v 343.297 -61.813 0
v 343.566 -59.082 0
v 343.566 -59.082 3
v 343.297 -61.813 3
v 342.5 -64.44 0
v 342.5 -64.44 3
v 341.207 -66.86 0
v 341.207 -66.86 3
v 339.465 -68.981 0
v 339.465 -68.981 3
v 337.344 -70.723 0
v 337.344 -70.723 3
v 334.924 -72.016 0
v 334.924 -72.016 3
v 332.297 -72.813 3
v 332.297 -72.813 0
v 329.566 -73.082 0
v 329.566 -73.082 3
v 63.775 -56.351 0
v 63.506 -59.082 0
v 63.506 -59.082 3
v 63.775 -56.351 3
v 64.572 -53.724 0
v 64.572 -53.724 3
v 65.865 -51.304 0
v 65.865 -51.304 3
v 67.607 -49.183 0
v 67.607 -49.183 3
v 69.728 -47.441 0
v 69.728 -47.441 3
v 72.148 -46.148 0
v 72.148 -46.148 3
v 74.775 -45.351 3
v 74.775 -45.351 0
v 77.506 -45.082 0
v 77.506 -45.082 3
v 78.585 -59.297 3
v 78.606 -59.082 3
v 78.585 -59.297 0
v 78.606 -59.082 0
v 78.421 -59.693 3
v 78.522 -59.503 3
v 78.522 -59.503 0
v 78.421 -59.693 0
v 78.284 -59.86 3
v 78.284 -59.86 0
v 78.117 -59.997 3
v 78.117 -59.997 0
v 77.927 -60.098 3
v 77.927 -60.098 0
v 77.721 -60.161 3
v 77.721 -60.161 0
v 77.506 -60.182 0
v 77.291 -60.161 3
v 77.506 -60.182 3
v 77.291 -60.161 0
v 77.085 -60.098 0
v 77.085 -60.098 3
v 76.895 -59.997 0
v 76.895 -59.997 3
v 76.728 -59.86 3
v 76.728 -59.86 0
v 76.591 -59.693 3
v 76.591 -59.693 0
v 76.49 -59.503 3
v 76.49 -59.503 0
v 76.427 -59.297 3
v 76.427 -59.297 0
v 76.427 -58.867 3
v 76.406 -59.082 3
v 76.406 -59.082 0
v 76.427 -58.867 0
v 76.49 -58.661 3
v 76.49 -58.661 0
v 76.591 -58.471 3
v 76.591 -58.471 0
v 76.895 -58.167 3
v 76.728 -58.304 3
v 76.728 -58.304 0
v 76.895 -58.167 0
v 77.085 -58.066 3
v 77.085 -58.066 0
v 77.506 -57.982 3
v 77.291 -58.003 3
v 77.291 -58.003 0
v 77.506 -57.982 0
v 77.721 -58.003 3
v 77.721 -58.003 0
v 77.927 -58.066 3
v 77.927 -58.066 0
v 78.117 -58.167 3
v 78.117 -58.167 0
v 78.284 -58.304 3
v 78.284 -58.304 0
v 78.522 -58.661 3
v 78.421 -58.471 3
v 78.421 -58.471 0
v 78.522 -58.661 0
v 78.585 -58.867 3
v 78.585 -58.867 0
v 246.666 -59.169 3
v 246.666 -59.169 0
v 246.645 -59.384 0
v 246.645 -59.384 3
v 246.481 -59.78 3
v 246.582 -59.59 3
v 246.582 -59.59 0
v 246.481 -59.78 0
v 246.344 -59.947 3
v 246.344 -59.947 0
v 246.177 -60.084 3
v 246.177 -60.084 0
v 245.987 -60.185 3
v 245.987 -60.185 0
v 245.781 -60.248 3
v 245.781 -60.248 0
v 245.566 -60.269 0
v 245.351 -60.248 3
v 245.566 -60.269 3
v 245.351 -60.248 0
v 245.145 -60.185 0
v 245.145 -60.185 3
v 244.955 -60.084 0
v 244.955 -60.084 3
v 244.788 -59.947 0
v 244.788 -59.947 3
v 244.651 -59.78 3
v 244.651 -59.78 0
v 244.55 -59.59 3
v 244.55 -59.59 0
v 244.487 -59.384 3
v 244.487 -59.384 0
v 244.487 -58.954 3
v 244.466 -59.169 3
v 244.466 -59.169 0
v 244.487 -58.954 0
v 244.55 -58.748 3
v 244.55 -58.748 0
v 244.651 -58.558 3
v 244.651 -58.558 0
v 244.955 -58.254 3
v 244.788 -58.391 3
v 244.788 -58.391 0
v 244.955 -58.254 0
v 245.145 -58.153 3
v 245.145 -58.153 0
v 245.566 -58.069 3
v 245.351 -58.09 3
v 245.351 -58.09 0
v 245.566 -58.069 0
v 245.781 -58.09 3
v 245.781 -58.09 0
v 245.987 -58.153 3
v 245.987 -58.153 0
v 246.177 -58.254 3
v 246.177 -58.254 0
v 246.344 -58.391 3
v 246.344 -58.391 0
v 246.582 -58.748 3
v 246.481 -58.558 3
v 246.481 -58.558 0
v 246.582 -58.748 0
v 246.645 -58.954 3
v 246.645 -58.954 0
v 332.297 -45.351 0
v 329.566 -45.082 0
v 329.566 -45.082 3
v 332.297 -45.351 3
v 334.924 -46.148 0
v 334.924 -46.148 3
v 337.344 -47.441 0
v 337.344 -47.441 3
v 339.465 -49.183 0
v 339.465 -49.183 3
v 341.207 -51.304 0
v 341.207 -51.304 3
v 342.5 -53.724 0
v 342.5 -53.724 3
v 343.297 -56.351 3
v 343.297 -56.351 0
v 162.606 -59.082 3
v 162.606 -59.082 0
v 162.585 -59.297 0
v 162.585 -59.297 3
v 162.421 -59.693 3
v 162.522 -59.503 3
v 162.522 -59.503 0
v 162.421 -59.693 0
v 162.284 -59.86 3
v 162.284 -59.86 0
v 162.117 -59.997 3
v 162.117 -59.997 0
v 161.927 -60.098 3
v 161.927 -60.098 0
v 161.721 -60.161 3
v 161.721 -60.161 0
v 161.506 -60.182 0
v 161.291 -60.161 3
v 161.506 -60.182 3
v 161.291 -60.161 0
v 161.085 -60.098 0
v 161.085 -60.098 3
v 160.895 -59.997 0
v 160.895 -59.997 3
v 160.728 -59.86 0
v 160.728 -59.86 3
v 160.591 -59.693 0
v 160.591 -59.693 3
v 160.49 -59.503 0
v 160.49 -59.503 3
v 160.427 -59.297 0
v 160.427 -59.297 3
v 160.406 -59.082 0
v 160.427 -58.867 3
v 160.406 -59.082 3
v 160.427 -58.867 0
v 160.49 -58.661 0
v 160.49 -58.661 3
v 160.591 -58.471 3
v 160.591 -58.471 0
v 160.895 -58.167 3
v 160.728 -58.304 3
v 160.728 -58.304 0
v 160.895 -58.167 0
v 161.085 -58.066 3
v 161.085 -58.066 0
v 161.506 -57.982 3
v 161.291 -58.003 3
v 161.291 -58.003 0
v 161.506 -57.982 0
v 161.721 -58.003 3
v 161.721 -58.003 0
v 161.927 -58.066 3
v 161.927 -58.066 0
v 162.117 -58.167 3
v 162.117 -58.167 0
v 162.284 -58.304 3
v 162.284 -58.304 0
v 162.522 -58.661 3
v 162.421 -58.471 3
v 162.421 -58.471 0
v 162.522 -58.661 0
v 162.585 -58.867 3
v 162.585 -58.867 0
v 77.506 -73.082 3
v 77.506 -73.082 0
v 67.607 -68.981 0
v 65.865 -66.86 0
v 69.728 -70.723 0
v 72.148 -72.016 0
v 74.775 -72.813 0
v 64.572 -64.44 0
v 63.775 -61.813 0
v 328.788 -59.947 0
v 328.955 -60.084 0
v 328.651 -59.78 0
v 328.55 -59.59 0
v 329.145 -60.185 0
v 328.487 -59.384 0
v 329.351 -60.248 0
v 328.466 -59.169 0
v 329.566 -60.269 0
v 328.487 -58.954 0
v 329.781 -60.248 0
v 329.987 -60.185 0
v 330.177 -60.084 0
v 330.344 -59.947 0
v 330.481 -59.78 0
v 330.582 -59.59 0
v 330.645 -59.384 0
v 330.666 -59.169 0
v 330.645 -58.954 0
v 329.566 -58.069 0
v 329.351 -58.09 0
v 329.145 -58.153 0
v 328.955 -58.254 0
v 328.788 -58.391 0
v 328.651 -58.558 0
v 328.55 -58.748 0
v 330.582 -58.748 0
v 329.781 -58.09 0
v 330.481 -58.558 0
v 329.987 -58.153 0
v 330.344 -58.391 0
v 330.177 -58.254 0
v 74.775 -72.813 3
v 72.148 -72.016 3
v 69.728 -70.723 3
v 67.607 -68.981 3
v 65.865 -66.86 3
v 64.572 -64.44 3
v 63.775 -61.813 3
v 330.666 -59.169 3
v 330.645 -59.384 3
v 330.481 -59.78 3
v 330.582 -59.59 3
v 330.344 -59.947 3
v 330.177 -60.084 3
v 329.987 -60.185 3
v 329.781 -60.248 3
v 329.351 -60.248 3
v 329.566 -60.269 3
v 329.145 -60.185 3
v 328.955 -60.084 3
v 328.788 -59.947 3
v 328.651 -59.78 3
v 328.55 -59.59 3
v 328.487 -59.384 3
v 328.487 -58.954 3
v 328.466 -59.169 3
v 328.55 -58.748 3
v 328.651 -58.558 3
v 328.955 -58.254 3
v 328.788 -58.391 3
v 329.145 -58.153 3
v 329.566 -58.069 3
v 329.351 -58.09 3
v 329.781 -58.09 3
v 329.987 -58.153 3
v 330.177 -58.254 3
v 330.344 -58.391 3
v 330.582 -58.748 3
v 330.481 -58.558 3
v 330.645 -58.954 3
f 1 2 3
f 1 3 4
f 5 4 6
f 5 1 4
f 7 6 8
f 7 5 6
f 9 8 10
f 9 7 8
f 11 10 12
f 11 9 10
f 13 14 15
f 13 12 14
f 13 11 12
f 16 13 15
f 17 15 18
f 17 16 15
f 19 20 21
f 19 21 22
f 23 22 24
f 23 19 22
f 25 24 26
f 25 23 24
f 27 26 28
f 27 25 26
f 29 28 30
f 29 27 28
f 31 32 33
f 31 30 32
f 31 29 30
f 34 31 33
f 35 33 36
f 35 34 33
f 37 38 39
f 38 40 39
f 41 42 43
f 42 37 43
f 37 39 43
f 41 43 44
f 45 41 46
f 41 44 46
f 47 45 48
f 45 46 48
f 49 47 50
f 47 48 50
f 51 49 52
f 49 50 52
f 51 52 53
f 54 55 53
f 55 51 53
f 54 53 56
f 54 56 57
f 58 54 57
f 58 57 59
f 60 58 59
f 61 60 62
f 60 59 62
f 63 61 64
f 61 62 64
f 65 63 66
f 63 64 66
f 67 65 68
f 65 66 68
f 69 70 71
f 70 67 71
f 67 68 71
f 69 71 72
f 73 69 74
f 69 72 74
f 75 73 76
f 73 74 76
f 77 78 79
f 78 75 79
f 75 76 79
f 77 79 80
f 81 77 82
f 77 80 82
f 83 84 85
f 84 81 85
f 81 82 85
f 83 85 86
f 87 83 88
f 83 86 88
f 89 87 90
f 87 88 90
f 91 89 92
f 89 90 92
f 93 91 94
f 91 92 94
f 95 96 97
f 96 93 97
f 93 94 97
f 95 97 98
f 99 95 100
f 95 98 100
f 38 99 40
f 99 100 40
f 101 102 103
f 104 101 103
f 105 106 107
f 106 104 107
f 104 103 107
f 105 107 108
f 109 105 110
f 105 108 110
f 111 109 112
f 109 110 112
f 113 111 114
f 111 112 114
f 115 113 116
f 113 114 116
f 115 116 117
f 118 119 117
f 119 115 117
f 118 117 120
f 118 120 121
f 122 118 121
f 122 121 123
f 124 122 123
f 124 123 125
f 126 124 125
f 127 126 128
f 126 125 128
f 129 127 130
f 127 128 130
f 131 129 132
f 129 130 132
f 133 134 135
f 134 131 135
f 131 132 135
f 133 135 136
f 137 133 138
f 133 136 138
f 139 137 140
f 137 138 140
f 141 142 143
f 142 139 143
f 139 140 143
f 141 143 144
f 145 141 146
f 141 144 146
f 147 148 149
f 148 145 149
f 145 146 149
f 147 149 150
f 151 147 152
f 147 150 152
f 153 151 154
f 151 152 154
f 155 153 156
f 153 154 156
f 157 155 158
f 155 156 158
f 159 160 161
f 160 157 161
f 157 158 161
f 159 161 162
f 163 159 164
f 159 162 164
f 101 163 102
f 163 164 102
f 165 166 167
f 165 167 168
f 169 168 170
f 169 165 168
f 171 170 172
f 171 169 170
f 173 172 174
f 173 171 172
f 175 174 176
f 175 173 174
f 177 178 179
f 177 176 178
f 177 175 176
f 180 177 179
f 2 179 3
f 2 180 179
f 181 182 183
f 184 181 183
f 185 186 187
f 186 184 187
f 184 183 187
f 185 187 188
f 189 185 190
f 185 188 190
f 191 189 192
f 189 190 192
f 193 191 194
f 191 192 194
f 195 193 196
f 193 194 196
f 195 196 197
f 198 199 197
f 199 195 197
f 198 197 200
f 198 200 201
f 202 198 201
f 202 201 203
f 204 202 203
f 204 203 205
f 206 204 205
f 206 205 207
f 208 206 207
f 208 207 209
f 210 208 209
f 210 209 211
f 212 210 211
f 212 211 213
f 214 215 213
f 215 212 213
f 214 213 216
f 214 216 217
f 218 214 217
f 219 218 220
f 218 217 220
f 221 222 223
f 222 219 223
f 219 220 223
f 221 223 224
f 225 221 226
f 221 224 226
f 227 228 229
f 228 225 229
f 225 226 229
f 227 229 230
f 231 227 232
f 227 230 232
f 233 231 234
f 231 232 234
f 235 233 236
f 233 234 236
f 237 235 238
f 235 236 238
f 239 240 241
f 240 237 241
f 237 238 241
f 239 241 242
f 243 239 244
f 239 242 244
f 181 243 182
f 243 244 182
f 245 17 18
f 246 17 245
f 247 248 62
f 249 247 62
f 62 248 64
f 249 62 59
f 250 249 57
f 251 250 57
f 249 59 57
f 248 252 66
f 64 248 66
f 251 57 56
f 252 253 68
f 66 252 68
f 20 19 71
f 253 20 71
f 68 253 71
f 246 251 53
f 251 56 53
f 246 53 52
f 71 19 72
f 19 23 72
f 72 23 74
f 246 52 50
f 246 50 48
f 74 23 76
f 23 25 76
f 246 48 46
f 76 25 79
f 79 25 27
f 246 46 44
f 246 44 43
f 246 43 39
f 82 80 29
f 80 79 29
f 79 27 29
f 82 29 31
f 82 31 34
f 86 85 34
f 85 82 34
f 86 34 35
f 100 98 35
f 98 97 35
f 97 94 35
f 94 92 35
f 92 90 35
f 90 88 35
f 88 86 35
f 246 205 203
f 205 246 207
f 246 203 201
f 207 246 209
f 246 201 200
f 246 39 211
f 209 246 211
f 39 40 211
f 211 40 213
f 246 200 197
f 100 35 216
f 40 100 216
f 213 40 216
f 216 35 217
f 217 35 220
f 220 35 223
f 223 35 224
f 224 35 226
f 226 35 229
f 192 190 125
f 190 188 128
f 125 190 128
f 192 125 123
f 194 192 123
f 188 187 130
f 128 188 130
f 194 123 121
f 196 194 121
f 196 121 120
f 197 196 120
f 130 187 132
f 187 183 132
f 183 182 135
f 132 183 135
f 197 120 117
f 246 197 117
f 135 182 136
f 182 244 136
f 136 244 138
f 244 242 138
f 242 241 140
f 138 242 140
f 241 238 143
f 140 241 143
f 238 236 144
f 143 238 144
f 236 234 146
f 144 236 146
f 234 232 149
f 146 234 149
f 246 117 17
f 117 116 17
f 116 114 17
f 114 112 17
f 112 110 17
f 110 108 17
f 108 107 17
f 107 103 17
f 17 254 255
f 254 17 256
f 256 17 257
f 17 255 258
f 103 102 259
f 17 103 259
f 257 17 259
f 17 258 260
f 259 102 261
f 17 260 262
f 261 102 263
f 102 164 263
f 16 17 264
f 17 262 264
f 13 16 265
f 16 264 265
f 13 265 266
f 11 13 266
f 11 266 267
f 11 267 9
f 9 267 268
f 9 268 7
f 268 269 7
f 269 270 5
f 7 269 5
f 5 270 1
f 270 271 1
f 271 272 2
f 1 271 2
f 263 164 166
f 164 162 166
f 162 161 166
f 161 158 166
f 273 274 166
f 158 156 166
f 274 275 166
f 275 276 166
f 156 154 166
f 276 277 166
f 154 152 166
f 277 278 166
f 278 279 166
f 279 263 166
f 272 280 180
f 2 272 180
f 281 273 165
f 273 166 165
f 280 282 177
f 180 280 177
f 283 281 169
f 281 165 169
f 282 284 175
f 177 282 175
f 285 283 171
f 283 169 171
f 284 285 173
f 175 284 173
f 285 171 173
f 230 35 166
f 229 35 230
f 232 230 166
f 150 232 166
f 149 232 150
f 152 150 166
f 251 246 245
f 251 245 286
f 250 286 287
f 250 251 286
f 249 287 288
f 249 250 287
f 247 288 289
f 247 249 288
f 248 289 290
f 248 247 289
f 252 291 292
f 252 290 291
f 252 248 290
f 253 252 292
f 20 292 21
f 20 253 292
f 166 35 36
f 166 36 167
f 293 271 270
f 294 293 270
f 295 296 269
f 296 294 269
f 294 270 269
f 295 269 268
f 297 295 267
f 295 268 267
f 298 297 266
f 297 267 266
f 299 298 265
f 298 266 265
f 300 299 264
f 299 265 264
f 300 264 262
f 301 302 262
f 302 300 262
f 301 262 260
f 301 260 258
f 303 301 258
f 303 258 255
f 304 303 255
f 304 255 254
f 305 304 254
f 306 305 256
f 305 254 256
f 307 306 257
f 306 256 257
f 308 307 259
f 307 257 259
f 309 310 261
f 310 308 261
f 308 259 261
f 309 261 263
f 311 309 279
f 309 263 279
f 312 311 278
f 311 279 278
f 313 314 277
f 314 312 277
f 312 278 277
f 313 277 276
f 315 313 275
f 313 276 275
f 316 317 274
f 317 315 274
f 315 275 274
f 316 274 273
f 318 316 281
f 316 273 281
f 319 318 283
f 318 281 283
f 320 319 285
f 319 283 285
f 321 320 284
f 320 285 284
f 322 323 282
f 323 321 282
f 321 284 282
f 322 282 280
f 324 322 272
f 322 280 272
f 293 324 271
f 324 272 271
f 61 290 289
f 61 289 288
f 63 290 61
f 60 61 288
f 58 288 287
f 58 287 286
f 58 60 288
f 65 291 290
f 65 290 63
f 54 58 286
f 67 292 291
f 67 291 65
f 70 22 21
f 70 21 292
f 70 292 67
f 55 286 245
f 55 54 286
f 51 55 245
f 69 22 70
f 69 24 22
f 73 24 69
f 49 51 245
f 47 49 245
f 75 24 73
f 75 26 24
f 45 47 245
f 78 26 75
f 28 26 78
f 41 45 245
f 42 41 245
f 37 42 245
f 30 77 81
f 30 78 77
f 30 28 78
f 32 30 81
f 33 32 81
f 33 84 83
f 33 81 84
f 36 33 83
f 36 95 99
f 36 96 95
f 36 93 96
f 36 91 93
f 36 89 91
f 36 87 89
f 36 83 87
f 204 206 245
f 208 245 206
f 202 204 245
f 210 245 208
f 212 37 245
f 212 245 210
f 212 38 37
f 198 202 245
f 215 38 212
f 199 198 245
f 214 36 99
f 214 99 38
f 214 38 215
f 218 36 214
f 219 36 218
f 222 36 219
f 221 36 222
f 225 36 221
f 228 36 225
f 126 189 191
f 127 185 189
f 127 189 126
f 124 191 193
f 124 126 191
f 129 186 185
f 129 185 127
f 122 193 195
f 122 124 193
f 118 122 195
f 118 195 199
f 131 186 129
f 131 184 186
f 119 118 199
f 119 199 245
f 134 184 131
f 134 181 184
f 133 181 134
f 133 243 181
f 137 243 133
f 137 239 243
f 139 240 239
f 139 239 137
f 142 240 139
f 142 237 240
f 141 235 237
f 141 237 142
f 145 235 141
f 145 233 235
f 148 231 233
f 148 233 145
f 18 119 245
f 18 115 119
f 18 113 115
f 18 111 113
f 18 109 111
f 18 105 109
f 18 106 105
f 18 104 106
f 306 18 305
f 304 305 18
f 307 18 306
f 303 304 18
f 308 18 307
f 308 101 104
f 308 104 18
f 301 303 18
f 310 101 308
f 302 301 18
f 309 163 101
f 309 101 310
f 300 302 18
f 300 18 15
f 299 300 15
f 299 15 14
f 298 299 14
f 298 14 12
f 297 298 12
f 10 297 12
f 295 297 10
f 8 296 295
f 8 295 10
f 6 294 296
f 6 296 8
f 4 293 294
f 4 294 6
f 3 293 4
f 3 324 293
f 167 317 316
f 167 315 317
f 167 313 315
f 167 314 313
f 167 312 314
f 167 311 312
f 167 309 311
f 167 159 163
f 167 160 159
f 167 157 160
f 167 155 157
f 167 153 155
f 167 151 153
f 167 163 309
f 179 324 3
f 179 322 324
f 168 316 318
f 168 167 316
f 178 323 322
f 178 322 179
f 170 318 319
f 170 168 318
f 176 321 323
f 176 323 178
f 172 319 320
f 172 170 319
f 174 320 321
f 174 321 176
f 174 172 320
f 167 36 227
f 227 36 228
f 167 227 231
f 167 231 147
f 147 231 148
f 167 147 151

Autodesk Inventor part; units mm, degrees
ref_plane "YZ Plane" through (0, 0, 0) normal (1, 0, 0) x (0, 1, 0)
ref_plane "XZ Plane" through (0, 0, 0) normal (0, 1, 0) x (-1, 0, 0)
ref_plane "XY Plane" through (0, 0, 0) normal (0, 0, 1) x (1, 0, 0)
ref_plane "Work Plane2" through (35.545, -31.609, 1.6) normal (0, 0, 1) x (1, 0, 0)
sketch "Sketch2" plane through (35.545, -31.609, 1.6) normal (0, 0, 1) x (1, 0, 0)
  line L0 (-4.7778, 3.1171) -> (341.5466, 3.1925) construction
  line L1 (341.5466, 3.1925) -> (341.5765, -133.848) construction
  line L2 (341.5765, -133.848) -> (-4.7479, -133.9235) construction
  line L3 (-4.7479, -133.9235) -> (-4.7778, 3.1171) construction
  point P0 (-35.545, 31.609)
ref_plane "Work Plane1" through (371.545, -162.609, 0) normal (0, 0, -1) x (-1, 0, 0)
sketch "Sketch9" plane through (371.545, -162.609, 0) normal (0, 0, -1) x (-1, 0, 0)
  line L0 (336, 131) -> (0, 131) projected
  line L1 (-2, 129) -> (-2, 2) projected
  line L2 (-1.9796, 129.2846) -> (-2, 129) projected
  line L3 (-1.919, 129.5635) -> (-1.9796, 129.2846) projected
  line L4 (-1.8193, 129.8308) -> (-1.919, 129.5635) projected
  line L5 (-1.6825, 130.0813) -> (-1.8193, 129.8308) projected
  line L6 (-1.5115, 130.3097) -> (-1.6825, 130.0813) projected
  line L7 (-1.3097, 130.5115) -> (-1.5115, 130.3097) projected
  line L8 (-1.0813, 130.6825) -> (-1.3097, 130.5115) projected
  line L9 (-0.8308, 130.8193) -> (-1.0813, 130.6825) projected
  line L10 (-0.5635, 130.919) -> (-0.8308, 130.8193) projected
  line L11 (-0.2846, 130.9796) -> (-0.5635, 130.919) projected
  line L12 (0, 131) -> (-0.2846, 130.9796) projected
  circle A0 centre (2.362, 128.645) radius 1.1 projected
  circle A1 centre (68.695, 128.645) radius 1.1 projected
  circle A2 centre (135.028, 128.645) radius 1.1 projected
  circle A3 centre (201.361, 128.645) radius 1.1 projected
  circle A4 centre (267.694, 128.645) radius 1.1 projected
  circle A5 centre (334.027, 128.645) radius 1.1 projected
  line L13 (338, 2) -> (338, 129) projected
  line L14 (338, 129) -> (337.9796, 129.2846) projected
  line L15 (337.9796, 129.2846) -> (337.919, 129.5635) projected
  line L16 (337.919, 129.5635) -> (337.8193, 129.8308) projected
  line L17 (337.8193, 129.8308) -> (337.6825, 130.0813) projected
  line L18 (337.6825, 130.0813) -> (337.5115, 130.3097) projected
  line L19 (337.5115, 130.3097) -> (337.3097, 130.5115) projected
  line L20 (337.3097, 130.5115) -> (337.0813, 130.6825) projected
  line L21 (337.0813, 130.6825) -> (336.8308, 130.8193) projected
  line L22 (336.8308, 130.8193) -> (336.5635, 130.919) projected
  line L23 (336.5635, 130.919) -> (336.2846, 130.9796) projected
  line L24 (336.2846, 130.9796) -> (336, 131) projected
  line L25 (0, 0) -> (336, 0) projected
  line L26 (336, 0) -> (336.2846, 0.0204) projected
  line L27 (336.2846, 0.0204) -> (336.5635, 0.081) projected
  line L28 (336.5635, 0.081) -> (336.8308, 0.1807) projected
  line L29 (336.8308, 0.1807) -> (337.0813, 0.3175) projected
  line L30 (337.0813, 0.3175) -> (337.3097, 0.4885) projected
  line L31 (337.3097, 0.4885) -> (337.5115, 0.6903) projected
  line L32 (337.5115, 0.6903) -> (337.6825, 0.9187) projected
  line L33 (337.6825, 0.9187) -> (337.8193, 1.1692) projected
  line L34 (337.8193, 1.1692) -> (337.919, 1.4365) projected
  line L35 (337.919, 1.4365) -> (337.9796, 1.7154) projected
  line L36 (337.9796, 1.7154) -> (338, 2) projected
  circle A6 centre (334.02, 2.37) radius 1.1 projected
  circle A7 centre (267.687, 2.37) radius 1.1 projected
  circle A8 centre (201.354, 2.37) radius 1.1 projected
  circle A9 centre (135.021, 2.37) radius 1.1 projected
  circle A10 centre (68.688, 2.37) radius 1.1 projected
  circle A11 centre (2.355, 2.37) radius 1.1 projected
  line L37 (-0.2846, 0.0204) -> (0, 0) projected
  line L38 (-0.5635, 0.081) -> (-0.2846, 0.0204) projected
  line L39 (-0.8308, 0.1807) -> (-0.5635, 0.081) projected
  line L40 (-1.0813, 0.3175) -> (-0.8308, 0.1807) projected
  line L41 (-1.3097, 0.4885) -> (-1.0813, 0.3175) projected
  line L42 (-1.5115, 0.6903) -> (-1.3097, 0.4885) projected
  line L43 (-1.6825, 0.9187) -> (-1.5115, 0.6903) projected
  line L44 (-1.8193, 1.1692) -> (-1.6825, 0.9187) projected
  line L45 (-1.919, 1.4365) -> (-1.8193, 1.1692) projected
  line L46 (-1.9796, 1.7154) -> (-1.919, 1.4365) projected
  line L47 (-2, 2) -> (-1.9796, 1.7154) projected
  circle A12 centre (41.979, 103.44) radius 1.1 projected
  circle A13 centre (125.979, 103.44) radius 1.1 projected
  circle A14 centre (210.039, 103.527) radius 1.1 projected
  circle A15 centre (294.039, 103.527) radius 1.1 projected
  point P0 (371.545, 162.609)
ref_plane "Work Plane3" through (371.545, -162.609, 0) normal (0, 0, 1) x (1, 0, 0)
sketch "Sketch10" plane through (371.545, -162.609, 0) normal (0, 0, 1) x (1, 0, 0)
  circle A0 centre (-294.039, 103.527) radius 1.1 projected
  circle A1 centre (-210.039, 103.527) radius 1.1 projected
  circle A2 centre (-125.979, 103.44) radius 1.1 projected
  circle A3 centre (-41.979, 103.44) radius 1.1 projected
  line L0 (-294.039, 117.527) -> (-41.979, 117.527)
  line L1 (-27.979, 103.527) -> (-27.979, 103.527)
  line L2 (-41.979, 89.527) -> (-294.039, 89.527)
  line L3 (-308.039, 103.527) -> (-308.039, 103.527)
  arc A4 (-27.979, 103.527) -> (-41.979, 117.527) centre (-41.979, 103.527) ccw
  arc A5 (-41.979, 89.527) -> (-27.979, 103.527) centre (-41.979, 103.527) ccw
  arc A6 (-294.039, 117.527) -> (-308.039, 103.527) centre (-294.039, 103.527) ccw
  arc A7 (-308.039, 103.527) -> (-294.039, 89.527) centre (-294.039, 103.527) ccw
  point P0 (-371.545, 162.609)
  point P1 (-27.979, 103.527)
  dimension "d89" = 14
  dimension "d90" = 14
  dimension "d91" = 14
  dimension "d92" = 14
  dimension "d93" = 14
extrude "Extrusion4" add sketch "Sketch10" along normal blind 3
properties part number "foot2"
